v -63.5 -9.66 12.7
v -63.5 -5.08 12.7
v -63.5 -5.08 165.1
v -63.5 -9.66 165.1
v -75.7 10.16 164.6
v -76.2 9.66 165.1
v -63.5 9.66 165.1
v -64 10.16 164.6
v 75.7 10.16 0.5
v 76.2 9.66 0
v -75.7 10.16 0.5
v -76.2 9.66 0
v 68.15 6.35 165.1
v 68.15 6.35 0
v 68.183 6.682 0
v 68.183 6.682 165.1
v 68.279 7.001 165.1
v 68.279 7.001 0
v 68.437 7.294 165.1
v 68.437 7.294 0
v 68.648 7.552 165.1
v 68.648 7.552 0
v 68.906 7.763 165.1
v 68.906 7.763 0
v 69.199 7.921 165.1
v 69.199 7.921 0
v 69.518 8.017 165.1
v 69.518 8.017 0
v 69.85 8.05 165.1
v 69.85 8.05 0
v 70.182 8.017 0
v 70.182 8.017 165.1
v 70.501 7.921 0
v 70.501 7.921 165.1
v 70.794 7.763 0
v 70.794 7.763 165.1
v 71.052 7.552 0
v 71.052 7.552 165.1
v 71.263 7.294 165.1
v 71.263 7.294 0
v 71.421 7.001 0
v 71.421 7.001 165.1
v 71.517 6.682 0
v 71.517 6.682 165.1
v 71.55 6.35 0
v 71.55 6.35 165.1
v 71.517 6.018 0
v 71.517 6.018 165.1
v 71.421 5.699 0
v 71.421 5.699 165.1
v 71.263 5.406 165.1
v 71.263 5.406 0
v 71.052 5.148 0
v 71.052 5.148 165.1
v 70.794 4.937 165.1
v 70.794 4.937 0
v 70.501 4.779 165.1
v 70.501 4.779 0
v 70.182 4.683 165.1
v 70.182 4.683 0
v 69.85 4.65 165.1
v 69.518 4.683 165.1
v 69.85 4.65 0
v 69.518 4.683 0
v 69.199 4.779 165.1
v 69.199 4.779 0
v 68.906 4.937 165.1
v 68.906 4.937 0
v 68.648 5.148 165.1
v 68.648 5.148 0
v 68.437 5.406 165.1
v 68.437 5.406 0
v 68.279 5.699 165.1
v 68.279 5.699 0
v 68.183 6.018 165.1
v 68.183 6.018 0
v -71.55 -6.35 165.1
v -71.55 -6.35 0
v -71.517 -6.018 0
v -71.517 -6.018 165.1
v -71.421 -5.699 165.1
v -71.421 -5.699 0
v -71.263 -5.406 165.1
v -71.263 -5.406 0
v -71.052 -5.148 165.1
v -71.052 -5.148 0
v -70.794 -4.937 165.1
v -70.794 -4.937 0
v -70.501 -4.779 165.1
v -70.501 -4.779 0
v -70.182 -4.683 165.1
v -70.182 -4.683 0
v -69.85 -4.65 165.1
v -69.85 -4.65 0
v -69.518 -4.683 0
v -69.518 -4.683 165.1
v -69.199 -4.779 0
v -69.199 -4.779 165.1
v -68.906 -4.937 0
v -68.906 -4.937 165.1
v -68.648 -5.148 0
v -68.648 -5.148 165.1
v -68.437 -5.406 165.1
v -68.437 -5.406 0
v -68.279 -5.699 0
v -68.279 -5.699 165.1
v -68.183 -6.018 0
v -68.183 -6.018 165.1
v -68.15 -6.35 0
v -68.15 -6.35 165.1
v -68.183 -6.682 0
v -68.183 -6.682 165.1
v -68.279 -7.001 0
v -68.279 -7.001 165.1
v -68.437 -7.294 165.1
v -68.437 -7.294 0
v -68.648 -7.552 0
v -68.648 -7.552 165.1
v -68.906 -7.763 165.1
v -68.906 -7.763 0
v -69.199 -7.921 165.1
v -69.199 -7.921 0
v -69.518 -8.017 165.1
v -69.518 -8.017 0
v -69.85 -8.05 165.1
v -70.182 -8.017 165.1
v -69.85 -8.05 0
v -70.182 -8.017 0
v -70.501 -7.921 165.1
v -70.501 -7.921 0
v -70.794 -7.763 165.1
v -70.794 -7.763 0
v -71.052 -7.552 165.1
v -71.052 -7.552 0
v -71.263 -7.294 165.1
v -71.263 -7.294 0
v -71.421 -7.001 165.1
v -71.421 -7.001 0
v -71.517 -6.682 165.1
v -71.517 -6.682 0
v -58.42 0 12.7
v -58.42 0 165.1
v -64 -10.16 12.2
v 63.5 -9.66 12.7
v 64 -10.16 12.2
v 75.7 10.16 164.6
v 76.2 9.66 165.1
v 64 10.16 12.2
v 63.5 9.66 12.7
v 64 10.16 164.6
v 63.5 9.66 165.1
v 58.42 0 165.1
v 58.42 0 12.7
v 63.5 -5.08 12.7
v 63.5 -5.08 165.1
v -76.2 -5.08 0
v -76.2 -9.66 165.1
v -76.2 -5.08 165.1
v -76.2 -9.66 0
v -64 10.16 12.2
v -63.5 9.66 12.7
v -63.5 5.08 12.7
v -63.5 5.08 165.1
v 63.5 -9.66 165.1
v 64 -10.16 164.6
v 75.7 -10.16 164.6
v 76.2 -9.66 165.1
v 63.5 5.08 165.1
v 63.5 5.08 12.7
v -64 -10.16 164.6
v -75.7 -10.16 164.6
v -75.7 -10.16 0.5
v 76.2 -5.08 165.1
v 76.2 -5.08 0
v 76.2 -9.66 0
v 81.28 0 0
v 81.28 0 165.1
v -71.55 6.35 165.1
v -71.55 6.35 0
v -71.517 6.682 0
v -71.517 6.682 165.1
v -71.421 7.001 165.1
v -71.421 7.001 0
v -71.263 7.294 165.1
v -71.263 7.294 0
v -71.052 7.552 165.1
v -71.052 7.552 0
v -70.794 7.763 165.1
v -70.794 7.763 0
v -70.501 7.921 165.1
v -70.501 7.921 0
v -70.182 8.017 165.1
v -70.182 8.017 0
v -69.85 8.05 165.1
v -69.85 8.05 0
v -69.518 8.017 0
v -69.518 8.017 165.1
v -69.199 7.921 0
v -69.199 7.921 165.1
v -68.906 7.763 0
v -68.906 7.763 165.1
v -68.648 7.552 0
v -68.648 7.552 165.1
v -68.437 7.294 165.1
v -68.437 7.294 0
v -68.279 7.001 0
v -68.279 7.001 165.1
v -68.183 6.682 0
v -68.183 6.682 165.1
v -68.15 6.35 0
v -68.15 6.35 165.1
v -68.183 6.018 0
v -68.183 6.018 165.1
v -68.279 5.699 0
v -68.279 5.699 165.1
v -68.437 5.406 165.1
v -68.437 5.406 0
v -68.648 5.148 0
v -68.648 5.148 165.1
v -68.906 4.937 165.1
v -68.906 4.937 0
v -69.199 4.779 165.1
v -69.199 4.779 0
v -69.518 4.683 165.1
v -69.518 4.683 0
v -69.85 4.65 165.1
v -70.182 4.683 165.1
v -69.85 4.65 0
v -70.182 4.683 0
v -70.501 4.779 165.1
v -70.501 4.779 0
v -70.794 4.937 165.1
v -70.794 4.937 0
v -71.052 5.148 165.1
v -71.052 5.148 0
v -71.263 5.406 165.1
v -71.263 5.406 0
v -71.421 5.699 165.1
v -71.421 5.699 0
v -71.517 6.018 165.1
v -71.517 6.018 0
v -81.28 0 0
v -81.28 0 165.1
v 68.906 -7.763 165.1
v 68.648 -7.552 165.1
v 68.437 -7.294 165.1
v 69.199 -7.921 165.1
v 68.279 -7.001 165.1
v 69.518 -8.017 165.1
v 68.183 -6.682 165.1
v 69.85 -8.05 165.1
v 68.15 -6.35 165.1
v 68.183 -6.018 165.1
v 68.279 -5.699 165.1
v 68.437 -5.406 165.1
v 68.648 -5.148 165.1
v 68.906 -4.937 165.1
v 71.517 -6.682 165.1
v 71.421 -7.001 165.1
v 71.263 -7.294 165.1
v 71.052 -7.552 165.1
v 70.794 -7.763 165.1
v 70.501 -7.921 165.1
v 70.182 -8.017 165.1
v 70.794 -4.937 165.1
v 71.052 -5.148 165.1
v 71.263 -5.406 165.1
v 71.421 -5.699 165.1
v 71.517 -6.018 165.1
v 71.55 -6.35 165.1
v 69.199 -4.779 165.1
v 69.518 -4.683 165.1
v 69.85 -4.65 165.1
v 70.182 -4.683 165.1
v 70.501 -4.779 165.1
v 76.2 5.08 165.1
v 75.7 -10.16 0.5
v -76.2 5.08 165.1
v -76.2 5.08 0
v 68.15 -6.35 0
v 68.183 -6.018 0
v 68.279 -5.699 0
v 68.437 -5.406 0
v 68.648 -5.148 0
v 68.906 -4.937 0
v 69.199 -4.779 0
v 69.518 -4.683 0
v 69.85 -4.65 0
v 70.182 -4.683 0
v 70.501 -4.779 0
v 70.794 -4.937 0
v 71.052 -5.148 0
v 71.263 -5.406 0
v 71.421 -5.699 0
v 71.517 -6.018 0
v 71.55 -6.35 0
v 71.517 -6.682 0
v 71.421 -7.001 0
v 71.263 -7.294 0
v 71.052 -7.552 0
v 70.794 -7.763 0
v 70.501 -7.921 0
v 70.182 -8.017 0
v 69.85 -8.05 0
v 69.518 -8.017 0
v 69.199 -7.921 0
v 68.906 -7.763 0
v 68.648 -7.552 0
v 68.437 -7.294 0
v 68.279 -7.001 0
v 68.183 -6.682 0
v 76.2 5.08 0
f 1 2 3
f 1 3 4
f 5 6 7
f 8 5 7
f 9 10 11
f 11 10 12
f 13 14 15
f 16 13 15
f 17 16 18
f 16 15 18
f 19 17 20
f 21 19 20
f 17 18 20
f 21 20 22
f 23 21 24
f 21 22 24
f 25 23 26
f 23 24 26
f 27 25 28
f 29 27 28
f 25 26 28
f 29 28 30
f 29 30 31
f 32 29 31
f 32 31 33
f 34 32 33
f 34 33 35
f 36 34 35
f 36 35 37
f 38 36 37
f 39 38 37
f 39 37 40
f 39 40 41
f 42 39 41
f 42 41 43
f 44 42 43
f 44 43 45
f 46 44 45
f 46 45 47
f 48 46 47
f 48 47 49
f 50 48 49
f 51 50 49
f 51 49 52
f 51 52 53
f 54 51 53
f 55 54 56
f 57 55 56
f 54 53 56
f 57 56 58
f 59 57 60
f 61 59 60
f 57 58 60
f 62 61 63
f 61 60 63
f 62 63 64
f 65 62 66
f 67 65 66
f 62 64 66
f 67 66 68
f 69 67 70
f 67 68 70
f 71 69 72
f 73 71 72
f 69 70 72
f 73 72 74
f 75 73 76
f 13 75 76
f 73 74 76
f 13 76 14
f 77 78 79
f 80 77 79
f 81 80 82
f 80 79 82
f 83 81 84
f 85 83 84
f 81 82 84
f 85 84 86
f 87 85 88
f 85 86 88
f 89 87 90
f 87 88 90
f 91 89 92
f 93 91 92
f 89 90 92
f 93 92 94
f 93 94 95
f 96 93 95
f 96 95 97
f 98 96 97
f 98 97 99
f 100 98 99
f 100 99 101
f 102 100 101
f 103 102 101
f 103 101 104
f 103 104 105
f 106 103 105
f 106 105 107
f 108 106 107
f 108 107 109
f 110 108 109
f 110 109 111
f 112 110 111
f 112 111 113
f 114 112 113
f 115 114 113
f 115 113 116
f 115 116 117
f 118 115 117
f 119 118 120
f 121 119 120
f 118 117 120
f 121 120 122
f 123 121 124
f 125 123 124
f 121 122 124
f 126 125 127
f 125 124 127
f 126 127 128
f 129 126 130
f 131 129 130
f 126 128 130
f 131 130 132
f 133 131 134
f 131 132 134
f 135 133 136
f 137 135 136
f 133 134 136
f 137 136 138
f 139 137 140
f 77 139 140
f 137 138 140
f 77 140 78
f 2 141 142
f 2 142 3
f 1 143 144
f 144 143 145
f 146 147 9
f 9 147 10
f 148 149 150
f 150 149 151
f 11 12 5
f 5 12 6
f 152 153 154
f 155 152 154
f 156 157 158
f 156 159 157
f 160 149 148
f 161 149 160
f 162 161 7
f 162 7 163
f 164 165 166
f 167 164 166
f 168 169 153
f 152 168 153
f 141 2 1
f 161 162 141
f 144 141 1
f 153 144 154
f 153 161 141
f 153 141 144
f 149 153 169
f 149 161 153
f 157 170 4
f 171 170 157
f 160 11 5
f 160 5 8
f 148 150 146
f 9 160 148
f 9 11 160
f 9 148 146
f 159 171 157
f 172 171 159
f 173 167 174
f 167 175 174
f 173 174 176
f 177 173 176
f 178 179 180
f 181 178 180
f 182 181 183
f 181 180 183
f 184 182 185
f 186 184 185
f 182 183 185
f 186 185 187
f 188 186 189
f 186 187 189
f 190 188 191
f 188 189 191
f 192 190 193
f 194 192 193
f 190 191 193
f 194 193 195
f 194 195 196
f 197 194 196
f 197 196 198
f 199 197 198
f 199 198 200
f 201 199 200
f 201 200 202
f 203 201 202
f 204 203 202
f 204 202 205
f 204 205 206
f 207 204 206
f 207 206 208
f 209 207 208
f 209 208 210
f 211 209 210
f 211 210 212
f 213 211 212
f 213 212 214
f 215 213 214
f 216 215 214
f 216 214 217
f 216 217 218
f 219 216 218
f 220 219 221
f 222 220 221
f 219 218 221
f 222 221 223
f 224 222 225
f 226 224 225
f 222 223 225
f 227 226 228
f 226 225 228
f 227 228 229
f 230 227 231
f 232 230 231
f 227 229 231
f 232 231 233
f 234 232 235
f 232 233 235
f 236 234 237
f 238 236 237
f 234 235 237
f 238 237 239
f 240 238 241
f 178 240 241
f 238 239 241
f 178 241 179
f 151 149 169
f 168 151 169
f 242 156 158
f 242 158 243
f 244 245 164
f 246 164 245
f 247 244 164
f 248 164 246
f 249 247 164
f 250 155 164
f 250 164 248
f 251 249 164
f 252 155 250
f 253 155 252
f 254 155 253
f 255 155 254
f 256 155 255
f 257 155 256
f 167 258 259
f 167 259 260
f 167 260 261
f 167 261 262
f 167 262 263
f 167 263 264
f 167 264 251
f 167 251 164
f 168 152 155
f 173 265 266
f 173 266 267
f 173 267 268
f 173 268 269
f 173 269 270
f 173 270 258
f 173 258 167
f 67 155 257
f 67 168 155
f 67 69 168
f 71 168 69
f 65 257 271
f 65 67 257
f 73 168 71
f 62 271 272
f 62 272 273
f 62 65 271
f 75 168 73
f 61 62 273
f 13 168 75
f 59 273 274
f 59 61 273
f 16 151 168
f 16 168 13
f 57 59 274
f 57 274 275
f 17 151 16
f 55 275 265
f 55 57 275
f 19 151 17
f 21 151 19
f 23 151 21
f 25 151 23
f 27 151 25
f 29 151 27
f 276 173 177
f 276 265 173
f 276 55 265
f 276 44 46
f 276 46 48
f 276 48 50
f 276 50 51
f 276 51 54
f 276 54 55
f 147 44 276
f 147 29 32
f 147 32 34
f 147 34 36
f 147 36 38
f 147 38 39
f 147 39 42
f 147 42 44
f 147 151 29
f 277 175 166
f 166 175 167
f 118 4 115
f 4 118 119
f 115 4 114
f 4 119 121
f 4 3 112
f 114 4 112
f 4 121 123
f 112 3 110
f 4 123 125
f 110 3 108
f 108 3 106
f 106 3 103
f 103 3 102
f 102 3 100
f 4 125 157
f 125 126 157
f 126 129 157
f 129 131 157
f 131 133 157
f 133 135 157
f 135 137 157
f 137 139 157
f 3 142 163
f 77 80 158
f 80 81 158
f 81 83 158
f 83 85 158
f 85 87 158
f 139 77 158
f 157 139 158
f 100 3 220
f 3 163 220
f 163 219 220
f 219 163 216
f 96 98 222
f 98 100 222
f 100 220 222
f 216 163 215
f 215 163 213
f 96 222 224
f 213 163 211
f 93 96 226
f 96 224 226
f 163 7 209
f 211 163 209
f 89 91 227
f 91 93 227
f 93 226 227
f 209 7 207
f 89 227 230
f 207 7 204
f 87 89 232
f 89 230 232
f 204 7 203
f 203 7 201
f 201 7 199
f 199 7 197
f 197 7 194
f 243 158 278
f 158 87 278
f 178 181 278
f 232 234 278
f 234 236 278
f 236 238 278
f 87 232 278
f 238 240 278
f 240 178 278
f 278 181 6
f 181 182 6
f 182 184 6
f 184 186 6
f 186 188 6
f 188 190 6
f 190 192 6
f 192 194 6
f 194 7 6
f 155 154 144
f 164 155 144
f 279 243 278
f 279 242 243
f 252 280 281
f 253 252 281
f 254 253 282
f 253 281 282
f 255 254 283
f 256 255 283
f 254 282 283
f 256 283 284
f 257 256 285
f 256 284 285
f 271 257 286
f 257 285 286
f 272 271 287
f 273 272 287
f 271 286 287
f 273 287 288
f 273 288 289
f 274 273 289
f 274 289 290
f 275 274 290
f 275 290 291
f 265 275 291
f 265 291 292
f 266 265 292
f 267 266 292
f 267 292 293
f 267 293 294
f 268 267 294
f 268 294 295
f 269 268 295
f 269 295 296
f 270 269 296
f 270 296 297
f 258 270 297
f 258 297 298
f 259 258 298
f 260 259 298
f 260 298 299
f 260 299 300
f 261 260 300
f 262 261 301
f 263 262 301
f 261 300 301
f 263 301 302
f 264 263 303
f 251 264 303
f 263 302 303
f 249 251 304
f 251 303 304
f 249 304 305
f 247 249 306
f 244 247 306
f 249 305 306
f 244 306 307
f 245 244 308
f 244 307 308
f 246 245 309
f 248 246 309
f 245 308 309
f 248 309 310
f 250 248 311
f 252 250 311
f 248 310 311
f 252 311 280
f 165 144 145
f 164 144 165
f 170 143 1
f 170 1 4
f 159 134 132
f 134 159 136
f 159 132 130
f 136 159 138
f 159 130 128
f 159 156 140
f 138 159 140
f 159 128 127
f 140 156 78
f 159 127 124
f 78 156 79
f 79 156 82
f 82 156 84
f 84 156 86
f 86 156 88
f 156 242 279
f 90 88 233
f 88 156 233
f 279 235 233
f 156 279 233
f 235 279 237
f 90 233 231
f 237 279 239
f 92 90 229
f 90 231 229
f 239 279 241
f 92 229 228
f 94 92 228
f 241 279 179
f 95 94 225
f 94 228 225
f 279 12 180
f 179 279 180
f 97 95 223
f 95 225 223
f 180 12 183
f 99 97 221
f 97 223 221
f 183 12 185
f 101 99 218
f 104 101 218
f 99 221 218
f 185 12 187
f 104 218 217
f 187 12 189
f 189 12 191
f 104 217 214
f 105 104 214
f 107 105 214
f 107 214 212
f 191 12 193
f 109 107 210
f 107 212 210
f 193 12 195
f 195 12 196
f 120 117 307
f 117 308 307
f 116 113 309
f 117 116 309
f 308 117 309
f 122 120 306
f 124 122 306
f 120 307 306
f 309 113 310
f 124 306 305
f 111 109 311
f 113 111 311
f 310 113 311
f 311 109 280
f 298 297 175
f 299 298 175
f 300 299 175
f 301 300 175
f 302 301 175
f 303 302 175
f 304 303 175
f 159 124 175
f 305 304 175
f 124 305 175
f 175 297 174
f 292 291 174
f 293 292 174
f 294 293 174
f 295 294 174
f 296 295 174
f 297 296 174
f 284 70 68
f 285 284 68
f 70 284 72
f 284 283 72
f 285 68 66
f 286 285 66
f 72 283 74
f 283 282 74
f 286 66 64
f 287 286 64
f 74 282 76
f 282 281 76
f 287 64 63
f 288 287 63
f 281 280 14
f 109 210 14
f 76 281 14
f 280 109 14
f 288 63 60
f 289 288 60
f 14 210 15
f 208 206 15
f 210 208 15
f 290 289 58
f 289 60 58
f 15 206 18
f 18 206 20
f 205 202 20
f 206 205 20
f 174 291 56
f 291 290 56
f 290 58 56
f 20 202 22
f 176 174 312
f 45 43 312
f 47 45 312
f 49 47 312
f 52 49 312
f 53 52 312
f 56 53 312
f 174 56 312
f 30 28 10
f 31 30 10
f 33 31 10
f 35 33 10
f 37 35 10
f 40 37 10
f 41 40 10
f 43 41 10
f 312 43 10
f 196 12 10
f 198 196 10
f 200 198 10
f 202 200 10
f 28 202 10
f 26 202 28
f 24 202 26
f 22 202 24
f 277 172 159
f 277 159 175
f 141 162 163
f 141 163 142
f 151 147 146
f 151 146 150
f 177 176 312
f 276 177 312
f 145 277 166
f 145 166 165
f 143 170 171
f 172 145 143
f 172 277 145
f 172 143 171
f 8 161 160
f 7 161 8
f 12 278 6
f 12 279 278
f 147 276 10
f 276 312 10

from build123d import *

# Parameters (mm, degrees)
BOSS_EXTRUDE1_DEPTH   = 12.7
BOSS_EXTRUDE2_DEPTH   = 152.4
F_6_32_TAPPED_HOLE1_D = 3.400000058
CHAMFER1_SIZE         = 0.5


with BuildPart() as part:
    # Sketch2 → Boss-Extrude1 (new body)
    with BuildSketch(Plane.XY):
        Polygon((-76.2, 5.08), (-81.28, 0), (-76.2, -5.08), (-76.2, -10.16), (76.2, -10.16), (76.2, -5.08), (81.28, 0), (76.2, 5.08), (76.2, 10.16), (-76.2, 10.16), align=None)
    extrude(amount=BOSS_EXTRUDE1_DEPTH)

    # Sketch3 → Boss-Extrude2 (add)
    with BuildSketch(Plane.XY.offset(12.7)):
        Polygon((-76.2, 10.16), (-63.5, 10.16), (-63.5, 5.08), (-58.42, 0), (-63.5, -5.08), (-63.5, -10.16), (-76.2, -10.16), (-76.2, -5.08), (-81.28, 0), (-76.2, 5.08), align=None)
        Polygon((63.5, 10.16), (63.5, 5.08), (58.42, 0), (63.5, -5.08), (63.5, -10.16), (76.2, -10.16), (76.2, -5.08), (81.28, 0), (76.2, 5.08), (76.2, 10.16), align=None)
    extrude(amount=BOSS_EXTRUDE2_DEPTH)

    # #6-32 Tapped Hole1 (through all)
    with Locations(Plane.XY.offset(165.1)):
        with Locations((-69.85, 6.35), (-69.85, -6.35), (69.85, 6.35), (69.85, -6.35)):
            Hole(F_6_32_TAPPED_HOLE1_D / 2)

    # Chamfer1
    chamfer1_edges = [part.edges().sort_by_distance(p)[0] for p in [
        (0, -10.16, 0),
        (0, 10.16, 0),
        (76.2, -10.16, 82.55),
        (-76.2, -10.16, 82.55),
        (-76.2, 10.16, 82.55),
        (76.2, 10.16, 82.55),
        (0, -10.16, 12.7),
        (-63.5, -10.16, 88.9),
        (-63.5, 10.16, 88.9),
        (-69.85, -10.16, 165.1),
        (-69.85, 10.16, 165.1),
        (0, 10.16, 12.7),
        (63.5, 10.16, 88.9),
        (63.5, -10.16, 88.9),
        (69.85, 10.16, 165.1),
        (69.85, -10.16, 165.1),
    ]]
    chamfer(chamfer1_edges, length=CHAMFER1_SIZE)


solid = part.part
